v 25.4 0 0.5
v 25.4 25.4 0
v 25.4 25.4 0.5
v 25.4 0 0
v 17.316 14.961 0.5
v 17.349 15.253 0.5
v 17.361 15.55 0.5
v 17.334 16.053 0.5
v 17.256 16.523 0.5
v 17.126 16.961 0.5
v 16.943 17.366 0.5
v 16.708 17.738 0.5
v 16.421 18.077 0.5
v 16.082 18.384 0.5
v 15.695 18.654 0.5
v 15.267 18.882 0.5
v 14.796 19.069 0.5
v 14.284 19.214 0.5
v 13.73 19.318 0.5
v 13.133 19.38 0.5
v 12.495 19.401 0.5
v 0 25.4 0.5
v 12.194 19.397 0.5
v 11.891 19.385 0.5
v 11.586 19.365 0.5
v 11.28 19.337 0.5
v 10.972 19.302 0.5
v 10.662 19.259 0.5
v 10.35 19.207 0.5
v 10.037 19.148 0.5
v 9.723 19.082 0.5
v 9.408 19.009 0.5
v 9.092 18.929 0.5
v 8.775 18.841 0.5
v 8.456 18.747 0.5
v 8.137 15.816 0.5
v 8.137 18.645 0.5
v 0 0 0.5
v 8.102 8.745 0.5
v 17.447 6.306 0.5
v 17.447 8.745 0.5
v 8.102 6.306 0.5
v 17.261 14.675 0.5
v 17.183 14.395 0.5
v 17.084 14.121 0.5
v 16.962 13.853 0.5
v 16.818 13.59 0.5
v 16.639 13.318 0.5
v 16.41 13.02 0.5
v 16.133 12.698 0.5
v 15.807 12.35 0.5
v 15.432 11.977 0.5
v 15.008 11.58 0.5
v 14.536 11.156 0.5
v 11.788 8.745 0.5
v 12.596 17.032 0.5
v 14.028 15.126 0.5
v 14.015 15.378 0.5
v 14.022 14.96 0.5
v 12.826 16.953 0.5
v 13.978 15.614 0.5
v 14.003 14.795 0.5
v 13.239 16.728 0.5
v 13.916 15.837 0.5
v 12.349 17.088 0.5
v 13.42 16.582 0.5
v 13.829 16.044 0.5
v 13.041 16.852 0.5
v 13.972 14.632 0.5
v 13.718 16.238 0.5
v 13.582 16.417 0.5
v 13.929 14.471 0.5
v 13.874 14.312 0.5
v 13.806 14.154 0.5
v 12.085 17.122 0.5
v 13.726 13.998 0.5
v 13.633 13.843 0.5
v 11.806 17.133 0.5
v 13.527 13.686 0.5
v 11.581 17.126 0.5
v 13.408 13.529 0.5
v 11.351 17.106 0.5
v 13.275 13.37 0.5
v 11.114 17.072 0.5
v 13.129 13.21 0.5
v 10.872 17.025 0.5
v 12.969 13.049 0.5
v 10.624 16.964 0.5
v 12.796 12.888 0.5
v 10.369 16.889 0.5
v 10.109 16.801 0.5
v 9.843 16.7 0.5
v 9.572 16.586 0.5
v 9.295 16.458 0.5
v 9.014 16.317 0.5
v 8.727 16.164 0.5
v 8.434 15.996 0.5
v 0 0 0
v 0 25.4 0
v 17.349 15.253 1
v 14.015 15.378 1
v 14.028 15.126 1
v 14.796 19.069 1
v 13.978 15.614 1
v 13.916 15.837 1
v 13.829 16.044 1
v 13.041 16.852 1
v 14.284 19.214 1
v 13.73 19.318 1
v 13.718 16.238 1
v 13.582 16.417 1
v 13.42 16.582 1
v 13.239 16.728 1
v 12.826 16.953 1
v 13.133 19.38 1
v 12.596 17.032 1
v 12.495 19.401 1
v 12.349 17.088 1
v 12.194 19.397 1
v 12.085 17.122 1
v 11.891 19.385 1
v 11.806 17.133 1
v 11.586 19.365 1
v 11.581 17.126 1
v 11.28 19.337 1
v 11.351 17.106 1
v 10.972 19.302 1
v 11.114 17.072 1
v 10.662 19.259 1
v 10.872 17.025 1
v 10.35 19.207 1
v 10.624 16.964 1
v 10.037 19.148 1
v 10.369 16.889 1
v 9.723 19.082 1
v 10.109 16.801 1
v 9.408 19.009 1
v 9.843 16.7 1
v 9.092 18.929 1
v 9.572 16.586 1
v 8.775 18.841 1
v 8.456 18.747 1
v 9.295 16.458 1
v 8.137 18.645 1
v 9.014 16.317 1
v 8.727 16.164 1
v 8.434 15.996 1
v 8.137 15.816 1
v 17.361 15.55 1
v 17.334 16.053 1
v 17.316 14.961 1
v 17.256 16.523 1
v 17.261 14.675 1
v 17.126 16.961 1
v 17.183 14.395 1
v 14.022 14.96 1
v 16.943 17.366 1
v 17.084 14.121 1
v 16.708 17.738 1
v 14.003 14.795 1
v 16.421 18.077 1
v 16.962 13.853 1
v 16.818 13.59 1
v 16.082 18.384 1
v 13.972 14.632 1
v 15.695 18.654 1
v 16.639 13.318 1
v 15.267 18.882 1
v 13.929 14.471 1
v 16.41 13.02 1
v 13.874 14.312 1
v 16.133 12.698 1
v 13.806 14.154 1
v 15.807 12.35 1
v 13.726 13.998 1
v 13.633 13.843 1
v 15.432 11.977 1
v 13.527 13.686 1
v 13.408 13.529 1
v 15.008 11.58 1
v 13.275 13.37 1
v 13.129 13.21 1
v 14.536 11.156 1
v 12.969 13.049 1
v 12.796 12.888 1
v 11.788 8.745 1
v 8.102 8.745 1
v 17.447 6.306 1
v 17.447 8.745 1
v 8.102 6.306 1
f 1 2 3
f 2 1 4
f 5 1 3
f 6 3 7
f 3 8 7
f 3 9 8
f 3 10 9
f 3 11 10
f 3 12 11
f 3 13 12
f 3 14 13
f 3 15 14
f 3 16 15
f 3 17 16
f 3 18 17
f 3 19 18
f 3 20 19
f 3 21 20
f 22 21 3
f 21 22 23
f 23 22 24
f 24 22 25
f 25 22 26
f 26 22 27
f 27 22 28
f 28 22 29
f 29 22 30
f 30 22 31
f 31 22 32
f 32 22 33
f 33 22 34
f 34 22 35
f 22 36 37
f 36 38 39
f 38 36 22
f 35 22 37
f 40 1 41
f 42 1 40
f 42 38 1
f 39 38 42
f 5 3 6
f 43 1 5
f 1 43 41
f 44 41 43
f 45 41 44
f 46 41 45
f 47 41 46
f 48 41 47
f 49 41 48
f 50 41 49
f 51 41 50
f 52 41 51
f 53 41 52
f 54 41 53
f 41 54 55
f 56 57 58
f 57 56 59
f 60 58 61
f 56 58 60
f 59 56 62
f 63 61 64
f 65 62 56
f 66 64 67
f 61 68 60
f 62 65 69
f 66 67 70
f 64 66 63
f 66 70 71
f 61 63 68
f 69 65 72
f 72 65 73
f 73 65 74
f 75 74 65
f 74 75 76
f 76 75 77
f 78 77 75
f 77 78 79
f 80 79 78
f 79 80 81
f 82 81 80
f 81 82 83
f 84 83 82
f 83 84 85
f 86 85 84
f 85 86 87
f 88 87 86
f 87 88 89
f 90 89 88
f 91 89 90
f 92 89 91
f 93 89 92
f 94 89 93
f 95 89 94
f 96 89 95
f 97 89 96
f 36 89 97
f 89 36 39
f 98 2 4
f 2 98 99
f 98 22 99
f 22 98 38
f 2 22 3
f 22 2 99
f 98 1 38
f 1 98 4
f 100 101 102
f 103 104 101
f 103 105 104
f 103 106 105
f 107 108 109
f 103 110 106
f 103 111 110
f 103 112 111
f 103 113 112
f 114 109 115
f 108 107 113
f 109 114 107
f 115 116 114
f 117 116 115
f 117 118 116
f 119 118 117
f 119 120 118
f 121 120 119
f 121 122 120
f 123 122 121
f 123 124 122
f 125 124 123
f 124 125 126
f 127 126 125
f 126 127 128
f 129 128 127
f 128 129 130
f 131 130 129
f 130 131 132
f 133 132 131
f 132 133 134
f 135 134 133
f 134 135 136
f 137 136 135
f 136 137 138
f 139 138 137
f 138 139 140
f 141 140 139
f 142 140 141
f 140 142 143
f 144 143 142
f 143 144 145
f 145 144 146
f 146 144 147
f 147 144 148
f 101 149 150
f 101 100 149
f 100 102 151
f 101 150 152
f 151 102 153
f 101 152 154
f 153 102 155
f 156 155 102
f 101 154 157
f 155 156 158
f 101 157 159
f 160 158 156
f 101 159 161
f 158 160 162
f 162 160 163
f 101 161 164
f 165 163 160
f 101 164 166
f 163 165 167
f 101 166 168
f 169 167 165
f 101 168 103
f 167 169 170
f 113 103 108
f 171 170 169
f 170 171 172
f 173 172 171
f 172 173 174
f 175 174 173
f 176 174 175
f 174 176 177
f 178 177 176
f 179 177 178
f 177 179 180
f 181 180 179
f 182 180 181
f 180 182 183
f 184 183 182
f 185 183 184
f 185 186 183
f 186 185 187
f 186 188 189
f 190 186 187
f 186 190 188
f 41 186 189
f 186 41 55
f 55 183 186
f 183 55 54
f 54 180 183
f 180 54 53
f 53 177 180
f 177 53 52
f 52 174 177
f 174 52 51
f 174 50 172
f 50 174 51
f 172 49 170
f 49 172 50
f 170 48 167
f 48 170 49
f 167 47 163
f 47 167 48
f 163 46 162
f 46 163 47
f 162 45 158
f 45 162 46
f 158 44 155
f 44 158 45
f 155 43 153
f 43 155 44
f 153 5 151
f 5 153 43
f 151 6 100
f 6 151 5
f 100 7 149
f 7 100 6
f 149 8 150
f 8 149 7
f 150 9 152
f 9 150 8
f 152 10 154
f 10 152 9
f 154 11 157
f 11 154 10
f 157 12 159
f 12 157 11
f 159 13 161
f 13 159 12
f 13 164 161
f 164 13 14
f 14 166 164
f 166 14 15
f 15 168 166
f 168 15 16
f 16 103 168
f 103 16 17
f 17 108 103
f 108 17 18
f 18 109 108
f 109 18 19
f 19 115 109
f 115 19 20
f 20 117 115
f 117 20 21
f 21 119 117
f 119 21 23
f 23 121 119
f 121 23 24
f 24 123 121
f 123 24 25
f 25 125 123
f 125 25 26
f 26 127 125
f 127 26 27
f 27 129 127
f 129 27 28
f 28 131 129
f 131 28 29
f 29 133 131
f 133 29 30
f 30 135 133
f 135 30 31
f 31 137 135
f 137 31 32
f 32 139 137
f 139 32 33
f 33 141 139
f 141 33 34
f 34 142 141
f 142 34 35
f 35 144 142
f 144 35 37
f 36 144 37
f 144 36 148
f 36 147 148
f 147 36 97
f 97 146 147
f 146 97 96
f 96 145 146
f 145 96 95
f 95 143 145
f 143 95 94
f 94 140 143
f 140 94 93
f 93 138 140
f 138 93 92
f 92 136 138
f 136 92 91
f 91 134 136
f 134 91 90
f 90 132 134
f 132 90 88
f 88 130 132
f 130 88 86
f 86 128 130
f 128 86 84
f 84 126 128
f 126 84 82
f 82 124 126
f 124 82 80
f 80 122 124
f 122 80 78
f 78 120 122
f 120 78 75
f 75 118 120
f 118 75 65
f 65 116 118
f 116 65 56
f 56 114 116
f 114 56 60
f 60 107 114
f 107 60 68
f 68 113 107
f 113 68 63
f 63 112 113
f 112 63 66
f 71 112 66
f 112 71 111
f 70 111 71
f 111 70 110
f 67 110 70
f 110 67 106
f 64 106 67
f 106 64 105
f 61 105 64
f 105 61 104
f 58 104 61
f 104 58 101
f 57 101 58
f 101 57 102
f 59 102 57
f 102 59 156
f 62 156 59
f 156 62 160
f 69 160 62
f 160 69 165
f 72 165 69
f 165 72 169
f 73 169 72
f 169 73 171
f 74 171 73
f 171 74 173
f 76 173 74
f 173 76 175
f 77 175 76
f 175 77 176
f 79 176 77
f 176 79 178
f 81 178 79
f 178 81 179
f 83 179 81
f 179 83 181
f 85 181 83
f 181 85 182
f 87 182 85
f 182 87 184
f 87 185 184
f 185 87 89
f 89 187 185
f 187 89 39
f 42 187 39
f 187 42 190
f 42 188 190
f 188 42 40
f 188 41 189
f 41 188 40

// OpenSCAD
// To get these to print the fine features created
// by the "text" command, I set "Outer wall" to
// 0.22mm. (Not really needed here, as the size of
// the text is quite large.)

inch = 25.4; // mm
$fn=50;
thick = 0.5; // mm
size = inch/2; 

// The basic decal without text.
color ("black") cube ([inch, inch, thick]);

// Put a bird on it.
color ("white")
  translate ([inch/2, inch/2, thick])
  linear_extrude(height=thick)
  text ("2", font=":style=Bold", size=size, valign="center", halign="center");
